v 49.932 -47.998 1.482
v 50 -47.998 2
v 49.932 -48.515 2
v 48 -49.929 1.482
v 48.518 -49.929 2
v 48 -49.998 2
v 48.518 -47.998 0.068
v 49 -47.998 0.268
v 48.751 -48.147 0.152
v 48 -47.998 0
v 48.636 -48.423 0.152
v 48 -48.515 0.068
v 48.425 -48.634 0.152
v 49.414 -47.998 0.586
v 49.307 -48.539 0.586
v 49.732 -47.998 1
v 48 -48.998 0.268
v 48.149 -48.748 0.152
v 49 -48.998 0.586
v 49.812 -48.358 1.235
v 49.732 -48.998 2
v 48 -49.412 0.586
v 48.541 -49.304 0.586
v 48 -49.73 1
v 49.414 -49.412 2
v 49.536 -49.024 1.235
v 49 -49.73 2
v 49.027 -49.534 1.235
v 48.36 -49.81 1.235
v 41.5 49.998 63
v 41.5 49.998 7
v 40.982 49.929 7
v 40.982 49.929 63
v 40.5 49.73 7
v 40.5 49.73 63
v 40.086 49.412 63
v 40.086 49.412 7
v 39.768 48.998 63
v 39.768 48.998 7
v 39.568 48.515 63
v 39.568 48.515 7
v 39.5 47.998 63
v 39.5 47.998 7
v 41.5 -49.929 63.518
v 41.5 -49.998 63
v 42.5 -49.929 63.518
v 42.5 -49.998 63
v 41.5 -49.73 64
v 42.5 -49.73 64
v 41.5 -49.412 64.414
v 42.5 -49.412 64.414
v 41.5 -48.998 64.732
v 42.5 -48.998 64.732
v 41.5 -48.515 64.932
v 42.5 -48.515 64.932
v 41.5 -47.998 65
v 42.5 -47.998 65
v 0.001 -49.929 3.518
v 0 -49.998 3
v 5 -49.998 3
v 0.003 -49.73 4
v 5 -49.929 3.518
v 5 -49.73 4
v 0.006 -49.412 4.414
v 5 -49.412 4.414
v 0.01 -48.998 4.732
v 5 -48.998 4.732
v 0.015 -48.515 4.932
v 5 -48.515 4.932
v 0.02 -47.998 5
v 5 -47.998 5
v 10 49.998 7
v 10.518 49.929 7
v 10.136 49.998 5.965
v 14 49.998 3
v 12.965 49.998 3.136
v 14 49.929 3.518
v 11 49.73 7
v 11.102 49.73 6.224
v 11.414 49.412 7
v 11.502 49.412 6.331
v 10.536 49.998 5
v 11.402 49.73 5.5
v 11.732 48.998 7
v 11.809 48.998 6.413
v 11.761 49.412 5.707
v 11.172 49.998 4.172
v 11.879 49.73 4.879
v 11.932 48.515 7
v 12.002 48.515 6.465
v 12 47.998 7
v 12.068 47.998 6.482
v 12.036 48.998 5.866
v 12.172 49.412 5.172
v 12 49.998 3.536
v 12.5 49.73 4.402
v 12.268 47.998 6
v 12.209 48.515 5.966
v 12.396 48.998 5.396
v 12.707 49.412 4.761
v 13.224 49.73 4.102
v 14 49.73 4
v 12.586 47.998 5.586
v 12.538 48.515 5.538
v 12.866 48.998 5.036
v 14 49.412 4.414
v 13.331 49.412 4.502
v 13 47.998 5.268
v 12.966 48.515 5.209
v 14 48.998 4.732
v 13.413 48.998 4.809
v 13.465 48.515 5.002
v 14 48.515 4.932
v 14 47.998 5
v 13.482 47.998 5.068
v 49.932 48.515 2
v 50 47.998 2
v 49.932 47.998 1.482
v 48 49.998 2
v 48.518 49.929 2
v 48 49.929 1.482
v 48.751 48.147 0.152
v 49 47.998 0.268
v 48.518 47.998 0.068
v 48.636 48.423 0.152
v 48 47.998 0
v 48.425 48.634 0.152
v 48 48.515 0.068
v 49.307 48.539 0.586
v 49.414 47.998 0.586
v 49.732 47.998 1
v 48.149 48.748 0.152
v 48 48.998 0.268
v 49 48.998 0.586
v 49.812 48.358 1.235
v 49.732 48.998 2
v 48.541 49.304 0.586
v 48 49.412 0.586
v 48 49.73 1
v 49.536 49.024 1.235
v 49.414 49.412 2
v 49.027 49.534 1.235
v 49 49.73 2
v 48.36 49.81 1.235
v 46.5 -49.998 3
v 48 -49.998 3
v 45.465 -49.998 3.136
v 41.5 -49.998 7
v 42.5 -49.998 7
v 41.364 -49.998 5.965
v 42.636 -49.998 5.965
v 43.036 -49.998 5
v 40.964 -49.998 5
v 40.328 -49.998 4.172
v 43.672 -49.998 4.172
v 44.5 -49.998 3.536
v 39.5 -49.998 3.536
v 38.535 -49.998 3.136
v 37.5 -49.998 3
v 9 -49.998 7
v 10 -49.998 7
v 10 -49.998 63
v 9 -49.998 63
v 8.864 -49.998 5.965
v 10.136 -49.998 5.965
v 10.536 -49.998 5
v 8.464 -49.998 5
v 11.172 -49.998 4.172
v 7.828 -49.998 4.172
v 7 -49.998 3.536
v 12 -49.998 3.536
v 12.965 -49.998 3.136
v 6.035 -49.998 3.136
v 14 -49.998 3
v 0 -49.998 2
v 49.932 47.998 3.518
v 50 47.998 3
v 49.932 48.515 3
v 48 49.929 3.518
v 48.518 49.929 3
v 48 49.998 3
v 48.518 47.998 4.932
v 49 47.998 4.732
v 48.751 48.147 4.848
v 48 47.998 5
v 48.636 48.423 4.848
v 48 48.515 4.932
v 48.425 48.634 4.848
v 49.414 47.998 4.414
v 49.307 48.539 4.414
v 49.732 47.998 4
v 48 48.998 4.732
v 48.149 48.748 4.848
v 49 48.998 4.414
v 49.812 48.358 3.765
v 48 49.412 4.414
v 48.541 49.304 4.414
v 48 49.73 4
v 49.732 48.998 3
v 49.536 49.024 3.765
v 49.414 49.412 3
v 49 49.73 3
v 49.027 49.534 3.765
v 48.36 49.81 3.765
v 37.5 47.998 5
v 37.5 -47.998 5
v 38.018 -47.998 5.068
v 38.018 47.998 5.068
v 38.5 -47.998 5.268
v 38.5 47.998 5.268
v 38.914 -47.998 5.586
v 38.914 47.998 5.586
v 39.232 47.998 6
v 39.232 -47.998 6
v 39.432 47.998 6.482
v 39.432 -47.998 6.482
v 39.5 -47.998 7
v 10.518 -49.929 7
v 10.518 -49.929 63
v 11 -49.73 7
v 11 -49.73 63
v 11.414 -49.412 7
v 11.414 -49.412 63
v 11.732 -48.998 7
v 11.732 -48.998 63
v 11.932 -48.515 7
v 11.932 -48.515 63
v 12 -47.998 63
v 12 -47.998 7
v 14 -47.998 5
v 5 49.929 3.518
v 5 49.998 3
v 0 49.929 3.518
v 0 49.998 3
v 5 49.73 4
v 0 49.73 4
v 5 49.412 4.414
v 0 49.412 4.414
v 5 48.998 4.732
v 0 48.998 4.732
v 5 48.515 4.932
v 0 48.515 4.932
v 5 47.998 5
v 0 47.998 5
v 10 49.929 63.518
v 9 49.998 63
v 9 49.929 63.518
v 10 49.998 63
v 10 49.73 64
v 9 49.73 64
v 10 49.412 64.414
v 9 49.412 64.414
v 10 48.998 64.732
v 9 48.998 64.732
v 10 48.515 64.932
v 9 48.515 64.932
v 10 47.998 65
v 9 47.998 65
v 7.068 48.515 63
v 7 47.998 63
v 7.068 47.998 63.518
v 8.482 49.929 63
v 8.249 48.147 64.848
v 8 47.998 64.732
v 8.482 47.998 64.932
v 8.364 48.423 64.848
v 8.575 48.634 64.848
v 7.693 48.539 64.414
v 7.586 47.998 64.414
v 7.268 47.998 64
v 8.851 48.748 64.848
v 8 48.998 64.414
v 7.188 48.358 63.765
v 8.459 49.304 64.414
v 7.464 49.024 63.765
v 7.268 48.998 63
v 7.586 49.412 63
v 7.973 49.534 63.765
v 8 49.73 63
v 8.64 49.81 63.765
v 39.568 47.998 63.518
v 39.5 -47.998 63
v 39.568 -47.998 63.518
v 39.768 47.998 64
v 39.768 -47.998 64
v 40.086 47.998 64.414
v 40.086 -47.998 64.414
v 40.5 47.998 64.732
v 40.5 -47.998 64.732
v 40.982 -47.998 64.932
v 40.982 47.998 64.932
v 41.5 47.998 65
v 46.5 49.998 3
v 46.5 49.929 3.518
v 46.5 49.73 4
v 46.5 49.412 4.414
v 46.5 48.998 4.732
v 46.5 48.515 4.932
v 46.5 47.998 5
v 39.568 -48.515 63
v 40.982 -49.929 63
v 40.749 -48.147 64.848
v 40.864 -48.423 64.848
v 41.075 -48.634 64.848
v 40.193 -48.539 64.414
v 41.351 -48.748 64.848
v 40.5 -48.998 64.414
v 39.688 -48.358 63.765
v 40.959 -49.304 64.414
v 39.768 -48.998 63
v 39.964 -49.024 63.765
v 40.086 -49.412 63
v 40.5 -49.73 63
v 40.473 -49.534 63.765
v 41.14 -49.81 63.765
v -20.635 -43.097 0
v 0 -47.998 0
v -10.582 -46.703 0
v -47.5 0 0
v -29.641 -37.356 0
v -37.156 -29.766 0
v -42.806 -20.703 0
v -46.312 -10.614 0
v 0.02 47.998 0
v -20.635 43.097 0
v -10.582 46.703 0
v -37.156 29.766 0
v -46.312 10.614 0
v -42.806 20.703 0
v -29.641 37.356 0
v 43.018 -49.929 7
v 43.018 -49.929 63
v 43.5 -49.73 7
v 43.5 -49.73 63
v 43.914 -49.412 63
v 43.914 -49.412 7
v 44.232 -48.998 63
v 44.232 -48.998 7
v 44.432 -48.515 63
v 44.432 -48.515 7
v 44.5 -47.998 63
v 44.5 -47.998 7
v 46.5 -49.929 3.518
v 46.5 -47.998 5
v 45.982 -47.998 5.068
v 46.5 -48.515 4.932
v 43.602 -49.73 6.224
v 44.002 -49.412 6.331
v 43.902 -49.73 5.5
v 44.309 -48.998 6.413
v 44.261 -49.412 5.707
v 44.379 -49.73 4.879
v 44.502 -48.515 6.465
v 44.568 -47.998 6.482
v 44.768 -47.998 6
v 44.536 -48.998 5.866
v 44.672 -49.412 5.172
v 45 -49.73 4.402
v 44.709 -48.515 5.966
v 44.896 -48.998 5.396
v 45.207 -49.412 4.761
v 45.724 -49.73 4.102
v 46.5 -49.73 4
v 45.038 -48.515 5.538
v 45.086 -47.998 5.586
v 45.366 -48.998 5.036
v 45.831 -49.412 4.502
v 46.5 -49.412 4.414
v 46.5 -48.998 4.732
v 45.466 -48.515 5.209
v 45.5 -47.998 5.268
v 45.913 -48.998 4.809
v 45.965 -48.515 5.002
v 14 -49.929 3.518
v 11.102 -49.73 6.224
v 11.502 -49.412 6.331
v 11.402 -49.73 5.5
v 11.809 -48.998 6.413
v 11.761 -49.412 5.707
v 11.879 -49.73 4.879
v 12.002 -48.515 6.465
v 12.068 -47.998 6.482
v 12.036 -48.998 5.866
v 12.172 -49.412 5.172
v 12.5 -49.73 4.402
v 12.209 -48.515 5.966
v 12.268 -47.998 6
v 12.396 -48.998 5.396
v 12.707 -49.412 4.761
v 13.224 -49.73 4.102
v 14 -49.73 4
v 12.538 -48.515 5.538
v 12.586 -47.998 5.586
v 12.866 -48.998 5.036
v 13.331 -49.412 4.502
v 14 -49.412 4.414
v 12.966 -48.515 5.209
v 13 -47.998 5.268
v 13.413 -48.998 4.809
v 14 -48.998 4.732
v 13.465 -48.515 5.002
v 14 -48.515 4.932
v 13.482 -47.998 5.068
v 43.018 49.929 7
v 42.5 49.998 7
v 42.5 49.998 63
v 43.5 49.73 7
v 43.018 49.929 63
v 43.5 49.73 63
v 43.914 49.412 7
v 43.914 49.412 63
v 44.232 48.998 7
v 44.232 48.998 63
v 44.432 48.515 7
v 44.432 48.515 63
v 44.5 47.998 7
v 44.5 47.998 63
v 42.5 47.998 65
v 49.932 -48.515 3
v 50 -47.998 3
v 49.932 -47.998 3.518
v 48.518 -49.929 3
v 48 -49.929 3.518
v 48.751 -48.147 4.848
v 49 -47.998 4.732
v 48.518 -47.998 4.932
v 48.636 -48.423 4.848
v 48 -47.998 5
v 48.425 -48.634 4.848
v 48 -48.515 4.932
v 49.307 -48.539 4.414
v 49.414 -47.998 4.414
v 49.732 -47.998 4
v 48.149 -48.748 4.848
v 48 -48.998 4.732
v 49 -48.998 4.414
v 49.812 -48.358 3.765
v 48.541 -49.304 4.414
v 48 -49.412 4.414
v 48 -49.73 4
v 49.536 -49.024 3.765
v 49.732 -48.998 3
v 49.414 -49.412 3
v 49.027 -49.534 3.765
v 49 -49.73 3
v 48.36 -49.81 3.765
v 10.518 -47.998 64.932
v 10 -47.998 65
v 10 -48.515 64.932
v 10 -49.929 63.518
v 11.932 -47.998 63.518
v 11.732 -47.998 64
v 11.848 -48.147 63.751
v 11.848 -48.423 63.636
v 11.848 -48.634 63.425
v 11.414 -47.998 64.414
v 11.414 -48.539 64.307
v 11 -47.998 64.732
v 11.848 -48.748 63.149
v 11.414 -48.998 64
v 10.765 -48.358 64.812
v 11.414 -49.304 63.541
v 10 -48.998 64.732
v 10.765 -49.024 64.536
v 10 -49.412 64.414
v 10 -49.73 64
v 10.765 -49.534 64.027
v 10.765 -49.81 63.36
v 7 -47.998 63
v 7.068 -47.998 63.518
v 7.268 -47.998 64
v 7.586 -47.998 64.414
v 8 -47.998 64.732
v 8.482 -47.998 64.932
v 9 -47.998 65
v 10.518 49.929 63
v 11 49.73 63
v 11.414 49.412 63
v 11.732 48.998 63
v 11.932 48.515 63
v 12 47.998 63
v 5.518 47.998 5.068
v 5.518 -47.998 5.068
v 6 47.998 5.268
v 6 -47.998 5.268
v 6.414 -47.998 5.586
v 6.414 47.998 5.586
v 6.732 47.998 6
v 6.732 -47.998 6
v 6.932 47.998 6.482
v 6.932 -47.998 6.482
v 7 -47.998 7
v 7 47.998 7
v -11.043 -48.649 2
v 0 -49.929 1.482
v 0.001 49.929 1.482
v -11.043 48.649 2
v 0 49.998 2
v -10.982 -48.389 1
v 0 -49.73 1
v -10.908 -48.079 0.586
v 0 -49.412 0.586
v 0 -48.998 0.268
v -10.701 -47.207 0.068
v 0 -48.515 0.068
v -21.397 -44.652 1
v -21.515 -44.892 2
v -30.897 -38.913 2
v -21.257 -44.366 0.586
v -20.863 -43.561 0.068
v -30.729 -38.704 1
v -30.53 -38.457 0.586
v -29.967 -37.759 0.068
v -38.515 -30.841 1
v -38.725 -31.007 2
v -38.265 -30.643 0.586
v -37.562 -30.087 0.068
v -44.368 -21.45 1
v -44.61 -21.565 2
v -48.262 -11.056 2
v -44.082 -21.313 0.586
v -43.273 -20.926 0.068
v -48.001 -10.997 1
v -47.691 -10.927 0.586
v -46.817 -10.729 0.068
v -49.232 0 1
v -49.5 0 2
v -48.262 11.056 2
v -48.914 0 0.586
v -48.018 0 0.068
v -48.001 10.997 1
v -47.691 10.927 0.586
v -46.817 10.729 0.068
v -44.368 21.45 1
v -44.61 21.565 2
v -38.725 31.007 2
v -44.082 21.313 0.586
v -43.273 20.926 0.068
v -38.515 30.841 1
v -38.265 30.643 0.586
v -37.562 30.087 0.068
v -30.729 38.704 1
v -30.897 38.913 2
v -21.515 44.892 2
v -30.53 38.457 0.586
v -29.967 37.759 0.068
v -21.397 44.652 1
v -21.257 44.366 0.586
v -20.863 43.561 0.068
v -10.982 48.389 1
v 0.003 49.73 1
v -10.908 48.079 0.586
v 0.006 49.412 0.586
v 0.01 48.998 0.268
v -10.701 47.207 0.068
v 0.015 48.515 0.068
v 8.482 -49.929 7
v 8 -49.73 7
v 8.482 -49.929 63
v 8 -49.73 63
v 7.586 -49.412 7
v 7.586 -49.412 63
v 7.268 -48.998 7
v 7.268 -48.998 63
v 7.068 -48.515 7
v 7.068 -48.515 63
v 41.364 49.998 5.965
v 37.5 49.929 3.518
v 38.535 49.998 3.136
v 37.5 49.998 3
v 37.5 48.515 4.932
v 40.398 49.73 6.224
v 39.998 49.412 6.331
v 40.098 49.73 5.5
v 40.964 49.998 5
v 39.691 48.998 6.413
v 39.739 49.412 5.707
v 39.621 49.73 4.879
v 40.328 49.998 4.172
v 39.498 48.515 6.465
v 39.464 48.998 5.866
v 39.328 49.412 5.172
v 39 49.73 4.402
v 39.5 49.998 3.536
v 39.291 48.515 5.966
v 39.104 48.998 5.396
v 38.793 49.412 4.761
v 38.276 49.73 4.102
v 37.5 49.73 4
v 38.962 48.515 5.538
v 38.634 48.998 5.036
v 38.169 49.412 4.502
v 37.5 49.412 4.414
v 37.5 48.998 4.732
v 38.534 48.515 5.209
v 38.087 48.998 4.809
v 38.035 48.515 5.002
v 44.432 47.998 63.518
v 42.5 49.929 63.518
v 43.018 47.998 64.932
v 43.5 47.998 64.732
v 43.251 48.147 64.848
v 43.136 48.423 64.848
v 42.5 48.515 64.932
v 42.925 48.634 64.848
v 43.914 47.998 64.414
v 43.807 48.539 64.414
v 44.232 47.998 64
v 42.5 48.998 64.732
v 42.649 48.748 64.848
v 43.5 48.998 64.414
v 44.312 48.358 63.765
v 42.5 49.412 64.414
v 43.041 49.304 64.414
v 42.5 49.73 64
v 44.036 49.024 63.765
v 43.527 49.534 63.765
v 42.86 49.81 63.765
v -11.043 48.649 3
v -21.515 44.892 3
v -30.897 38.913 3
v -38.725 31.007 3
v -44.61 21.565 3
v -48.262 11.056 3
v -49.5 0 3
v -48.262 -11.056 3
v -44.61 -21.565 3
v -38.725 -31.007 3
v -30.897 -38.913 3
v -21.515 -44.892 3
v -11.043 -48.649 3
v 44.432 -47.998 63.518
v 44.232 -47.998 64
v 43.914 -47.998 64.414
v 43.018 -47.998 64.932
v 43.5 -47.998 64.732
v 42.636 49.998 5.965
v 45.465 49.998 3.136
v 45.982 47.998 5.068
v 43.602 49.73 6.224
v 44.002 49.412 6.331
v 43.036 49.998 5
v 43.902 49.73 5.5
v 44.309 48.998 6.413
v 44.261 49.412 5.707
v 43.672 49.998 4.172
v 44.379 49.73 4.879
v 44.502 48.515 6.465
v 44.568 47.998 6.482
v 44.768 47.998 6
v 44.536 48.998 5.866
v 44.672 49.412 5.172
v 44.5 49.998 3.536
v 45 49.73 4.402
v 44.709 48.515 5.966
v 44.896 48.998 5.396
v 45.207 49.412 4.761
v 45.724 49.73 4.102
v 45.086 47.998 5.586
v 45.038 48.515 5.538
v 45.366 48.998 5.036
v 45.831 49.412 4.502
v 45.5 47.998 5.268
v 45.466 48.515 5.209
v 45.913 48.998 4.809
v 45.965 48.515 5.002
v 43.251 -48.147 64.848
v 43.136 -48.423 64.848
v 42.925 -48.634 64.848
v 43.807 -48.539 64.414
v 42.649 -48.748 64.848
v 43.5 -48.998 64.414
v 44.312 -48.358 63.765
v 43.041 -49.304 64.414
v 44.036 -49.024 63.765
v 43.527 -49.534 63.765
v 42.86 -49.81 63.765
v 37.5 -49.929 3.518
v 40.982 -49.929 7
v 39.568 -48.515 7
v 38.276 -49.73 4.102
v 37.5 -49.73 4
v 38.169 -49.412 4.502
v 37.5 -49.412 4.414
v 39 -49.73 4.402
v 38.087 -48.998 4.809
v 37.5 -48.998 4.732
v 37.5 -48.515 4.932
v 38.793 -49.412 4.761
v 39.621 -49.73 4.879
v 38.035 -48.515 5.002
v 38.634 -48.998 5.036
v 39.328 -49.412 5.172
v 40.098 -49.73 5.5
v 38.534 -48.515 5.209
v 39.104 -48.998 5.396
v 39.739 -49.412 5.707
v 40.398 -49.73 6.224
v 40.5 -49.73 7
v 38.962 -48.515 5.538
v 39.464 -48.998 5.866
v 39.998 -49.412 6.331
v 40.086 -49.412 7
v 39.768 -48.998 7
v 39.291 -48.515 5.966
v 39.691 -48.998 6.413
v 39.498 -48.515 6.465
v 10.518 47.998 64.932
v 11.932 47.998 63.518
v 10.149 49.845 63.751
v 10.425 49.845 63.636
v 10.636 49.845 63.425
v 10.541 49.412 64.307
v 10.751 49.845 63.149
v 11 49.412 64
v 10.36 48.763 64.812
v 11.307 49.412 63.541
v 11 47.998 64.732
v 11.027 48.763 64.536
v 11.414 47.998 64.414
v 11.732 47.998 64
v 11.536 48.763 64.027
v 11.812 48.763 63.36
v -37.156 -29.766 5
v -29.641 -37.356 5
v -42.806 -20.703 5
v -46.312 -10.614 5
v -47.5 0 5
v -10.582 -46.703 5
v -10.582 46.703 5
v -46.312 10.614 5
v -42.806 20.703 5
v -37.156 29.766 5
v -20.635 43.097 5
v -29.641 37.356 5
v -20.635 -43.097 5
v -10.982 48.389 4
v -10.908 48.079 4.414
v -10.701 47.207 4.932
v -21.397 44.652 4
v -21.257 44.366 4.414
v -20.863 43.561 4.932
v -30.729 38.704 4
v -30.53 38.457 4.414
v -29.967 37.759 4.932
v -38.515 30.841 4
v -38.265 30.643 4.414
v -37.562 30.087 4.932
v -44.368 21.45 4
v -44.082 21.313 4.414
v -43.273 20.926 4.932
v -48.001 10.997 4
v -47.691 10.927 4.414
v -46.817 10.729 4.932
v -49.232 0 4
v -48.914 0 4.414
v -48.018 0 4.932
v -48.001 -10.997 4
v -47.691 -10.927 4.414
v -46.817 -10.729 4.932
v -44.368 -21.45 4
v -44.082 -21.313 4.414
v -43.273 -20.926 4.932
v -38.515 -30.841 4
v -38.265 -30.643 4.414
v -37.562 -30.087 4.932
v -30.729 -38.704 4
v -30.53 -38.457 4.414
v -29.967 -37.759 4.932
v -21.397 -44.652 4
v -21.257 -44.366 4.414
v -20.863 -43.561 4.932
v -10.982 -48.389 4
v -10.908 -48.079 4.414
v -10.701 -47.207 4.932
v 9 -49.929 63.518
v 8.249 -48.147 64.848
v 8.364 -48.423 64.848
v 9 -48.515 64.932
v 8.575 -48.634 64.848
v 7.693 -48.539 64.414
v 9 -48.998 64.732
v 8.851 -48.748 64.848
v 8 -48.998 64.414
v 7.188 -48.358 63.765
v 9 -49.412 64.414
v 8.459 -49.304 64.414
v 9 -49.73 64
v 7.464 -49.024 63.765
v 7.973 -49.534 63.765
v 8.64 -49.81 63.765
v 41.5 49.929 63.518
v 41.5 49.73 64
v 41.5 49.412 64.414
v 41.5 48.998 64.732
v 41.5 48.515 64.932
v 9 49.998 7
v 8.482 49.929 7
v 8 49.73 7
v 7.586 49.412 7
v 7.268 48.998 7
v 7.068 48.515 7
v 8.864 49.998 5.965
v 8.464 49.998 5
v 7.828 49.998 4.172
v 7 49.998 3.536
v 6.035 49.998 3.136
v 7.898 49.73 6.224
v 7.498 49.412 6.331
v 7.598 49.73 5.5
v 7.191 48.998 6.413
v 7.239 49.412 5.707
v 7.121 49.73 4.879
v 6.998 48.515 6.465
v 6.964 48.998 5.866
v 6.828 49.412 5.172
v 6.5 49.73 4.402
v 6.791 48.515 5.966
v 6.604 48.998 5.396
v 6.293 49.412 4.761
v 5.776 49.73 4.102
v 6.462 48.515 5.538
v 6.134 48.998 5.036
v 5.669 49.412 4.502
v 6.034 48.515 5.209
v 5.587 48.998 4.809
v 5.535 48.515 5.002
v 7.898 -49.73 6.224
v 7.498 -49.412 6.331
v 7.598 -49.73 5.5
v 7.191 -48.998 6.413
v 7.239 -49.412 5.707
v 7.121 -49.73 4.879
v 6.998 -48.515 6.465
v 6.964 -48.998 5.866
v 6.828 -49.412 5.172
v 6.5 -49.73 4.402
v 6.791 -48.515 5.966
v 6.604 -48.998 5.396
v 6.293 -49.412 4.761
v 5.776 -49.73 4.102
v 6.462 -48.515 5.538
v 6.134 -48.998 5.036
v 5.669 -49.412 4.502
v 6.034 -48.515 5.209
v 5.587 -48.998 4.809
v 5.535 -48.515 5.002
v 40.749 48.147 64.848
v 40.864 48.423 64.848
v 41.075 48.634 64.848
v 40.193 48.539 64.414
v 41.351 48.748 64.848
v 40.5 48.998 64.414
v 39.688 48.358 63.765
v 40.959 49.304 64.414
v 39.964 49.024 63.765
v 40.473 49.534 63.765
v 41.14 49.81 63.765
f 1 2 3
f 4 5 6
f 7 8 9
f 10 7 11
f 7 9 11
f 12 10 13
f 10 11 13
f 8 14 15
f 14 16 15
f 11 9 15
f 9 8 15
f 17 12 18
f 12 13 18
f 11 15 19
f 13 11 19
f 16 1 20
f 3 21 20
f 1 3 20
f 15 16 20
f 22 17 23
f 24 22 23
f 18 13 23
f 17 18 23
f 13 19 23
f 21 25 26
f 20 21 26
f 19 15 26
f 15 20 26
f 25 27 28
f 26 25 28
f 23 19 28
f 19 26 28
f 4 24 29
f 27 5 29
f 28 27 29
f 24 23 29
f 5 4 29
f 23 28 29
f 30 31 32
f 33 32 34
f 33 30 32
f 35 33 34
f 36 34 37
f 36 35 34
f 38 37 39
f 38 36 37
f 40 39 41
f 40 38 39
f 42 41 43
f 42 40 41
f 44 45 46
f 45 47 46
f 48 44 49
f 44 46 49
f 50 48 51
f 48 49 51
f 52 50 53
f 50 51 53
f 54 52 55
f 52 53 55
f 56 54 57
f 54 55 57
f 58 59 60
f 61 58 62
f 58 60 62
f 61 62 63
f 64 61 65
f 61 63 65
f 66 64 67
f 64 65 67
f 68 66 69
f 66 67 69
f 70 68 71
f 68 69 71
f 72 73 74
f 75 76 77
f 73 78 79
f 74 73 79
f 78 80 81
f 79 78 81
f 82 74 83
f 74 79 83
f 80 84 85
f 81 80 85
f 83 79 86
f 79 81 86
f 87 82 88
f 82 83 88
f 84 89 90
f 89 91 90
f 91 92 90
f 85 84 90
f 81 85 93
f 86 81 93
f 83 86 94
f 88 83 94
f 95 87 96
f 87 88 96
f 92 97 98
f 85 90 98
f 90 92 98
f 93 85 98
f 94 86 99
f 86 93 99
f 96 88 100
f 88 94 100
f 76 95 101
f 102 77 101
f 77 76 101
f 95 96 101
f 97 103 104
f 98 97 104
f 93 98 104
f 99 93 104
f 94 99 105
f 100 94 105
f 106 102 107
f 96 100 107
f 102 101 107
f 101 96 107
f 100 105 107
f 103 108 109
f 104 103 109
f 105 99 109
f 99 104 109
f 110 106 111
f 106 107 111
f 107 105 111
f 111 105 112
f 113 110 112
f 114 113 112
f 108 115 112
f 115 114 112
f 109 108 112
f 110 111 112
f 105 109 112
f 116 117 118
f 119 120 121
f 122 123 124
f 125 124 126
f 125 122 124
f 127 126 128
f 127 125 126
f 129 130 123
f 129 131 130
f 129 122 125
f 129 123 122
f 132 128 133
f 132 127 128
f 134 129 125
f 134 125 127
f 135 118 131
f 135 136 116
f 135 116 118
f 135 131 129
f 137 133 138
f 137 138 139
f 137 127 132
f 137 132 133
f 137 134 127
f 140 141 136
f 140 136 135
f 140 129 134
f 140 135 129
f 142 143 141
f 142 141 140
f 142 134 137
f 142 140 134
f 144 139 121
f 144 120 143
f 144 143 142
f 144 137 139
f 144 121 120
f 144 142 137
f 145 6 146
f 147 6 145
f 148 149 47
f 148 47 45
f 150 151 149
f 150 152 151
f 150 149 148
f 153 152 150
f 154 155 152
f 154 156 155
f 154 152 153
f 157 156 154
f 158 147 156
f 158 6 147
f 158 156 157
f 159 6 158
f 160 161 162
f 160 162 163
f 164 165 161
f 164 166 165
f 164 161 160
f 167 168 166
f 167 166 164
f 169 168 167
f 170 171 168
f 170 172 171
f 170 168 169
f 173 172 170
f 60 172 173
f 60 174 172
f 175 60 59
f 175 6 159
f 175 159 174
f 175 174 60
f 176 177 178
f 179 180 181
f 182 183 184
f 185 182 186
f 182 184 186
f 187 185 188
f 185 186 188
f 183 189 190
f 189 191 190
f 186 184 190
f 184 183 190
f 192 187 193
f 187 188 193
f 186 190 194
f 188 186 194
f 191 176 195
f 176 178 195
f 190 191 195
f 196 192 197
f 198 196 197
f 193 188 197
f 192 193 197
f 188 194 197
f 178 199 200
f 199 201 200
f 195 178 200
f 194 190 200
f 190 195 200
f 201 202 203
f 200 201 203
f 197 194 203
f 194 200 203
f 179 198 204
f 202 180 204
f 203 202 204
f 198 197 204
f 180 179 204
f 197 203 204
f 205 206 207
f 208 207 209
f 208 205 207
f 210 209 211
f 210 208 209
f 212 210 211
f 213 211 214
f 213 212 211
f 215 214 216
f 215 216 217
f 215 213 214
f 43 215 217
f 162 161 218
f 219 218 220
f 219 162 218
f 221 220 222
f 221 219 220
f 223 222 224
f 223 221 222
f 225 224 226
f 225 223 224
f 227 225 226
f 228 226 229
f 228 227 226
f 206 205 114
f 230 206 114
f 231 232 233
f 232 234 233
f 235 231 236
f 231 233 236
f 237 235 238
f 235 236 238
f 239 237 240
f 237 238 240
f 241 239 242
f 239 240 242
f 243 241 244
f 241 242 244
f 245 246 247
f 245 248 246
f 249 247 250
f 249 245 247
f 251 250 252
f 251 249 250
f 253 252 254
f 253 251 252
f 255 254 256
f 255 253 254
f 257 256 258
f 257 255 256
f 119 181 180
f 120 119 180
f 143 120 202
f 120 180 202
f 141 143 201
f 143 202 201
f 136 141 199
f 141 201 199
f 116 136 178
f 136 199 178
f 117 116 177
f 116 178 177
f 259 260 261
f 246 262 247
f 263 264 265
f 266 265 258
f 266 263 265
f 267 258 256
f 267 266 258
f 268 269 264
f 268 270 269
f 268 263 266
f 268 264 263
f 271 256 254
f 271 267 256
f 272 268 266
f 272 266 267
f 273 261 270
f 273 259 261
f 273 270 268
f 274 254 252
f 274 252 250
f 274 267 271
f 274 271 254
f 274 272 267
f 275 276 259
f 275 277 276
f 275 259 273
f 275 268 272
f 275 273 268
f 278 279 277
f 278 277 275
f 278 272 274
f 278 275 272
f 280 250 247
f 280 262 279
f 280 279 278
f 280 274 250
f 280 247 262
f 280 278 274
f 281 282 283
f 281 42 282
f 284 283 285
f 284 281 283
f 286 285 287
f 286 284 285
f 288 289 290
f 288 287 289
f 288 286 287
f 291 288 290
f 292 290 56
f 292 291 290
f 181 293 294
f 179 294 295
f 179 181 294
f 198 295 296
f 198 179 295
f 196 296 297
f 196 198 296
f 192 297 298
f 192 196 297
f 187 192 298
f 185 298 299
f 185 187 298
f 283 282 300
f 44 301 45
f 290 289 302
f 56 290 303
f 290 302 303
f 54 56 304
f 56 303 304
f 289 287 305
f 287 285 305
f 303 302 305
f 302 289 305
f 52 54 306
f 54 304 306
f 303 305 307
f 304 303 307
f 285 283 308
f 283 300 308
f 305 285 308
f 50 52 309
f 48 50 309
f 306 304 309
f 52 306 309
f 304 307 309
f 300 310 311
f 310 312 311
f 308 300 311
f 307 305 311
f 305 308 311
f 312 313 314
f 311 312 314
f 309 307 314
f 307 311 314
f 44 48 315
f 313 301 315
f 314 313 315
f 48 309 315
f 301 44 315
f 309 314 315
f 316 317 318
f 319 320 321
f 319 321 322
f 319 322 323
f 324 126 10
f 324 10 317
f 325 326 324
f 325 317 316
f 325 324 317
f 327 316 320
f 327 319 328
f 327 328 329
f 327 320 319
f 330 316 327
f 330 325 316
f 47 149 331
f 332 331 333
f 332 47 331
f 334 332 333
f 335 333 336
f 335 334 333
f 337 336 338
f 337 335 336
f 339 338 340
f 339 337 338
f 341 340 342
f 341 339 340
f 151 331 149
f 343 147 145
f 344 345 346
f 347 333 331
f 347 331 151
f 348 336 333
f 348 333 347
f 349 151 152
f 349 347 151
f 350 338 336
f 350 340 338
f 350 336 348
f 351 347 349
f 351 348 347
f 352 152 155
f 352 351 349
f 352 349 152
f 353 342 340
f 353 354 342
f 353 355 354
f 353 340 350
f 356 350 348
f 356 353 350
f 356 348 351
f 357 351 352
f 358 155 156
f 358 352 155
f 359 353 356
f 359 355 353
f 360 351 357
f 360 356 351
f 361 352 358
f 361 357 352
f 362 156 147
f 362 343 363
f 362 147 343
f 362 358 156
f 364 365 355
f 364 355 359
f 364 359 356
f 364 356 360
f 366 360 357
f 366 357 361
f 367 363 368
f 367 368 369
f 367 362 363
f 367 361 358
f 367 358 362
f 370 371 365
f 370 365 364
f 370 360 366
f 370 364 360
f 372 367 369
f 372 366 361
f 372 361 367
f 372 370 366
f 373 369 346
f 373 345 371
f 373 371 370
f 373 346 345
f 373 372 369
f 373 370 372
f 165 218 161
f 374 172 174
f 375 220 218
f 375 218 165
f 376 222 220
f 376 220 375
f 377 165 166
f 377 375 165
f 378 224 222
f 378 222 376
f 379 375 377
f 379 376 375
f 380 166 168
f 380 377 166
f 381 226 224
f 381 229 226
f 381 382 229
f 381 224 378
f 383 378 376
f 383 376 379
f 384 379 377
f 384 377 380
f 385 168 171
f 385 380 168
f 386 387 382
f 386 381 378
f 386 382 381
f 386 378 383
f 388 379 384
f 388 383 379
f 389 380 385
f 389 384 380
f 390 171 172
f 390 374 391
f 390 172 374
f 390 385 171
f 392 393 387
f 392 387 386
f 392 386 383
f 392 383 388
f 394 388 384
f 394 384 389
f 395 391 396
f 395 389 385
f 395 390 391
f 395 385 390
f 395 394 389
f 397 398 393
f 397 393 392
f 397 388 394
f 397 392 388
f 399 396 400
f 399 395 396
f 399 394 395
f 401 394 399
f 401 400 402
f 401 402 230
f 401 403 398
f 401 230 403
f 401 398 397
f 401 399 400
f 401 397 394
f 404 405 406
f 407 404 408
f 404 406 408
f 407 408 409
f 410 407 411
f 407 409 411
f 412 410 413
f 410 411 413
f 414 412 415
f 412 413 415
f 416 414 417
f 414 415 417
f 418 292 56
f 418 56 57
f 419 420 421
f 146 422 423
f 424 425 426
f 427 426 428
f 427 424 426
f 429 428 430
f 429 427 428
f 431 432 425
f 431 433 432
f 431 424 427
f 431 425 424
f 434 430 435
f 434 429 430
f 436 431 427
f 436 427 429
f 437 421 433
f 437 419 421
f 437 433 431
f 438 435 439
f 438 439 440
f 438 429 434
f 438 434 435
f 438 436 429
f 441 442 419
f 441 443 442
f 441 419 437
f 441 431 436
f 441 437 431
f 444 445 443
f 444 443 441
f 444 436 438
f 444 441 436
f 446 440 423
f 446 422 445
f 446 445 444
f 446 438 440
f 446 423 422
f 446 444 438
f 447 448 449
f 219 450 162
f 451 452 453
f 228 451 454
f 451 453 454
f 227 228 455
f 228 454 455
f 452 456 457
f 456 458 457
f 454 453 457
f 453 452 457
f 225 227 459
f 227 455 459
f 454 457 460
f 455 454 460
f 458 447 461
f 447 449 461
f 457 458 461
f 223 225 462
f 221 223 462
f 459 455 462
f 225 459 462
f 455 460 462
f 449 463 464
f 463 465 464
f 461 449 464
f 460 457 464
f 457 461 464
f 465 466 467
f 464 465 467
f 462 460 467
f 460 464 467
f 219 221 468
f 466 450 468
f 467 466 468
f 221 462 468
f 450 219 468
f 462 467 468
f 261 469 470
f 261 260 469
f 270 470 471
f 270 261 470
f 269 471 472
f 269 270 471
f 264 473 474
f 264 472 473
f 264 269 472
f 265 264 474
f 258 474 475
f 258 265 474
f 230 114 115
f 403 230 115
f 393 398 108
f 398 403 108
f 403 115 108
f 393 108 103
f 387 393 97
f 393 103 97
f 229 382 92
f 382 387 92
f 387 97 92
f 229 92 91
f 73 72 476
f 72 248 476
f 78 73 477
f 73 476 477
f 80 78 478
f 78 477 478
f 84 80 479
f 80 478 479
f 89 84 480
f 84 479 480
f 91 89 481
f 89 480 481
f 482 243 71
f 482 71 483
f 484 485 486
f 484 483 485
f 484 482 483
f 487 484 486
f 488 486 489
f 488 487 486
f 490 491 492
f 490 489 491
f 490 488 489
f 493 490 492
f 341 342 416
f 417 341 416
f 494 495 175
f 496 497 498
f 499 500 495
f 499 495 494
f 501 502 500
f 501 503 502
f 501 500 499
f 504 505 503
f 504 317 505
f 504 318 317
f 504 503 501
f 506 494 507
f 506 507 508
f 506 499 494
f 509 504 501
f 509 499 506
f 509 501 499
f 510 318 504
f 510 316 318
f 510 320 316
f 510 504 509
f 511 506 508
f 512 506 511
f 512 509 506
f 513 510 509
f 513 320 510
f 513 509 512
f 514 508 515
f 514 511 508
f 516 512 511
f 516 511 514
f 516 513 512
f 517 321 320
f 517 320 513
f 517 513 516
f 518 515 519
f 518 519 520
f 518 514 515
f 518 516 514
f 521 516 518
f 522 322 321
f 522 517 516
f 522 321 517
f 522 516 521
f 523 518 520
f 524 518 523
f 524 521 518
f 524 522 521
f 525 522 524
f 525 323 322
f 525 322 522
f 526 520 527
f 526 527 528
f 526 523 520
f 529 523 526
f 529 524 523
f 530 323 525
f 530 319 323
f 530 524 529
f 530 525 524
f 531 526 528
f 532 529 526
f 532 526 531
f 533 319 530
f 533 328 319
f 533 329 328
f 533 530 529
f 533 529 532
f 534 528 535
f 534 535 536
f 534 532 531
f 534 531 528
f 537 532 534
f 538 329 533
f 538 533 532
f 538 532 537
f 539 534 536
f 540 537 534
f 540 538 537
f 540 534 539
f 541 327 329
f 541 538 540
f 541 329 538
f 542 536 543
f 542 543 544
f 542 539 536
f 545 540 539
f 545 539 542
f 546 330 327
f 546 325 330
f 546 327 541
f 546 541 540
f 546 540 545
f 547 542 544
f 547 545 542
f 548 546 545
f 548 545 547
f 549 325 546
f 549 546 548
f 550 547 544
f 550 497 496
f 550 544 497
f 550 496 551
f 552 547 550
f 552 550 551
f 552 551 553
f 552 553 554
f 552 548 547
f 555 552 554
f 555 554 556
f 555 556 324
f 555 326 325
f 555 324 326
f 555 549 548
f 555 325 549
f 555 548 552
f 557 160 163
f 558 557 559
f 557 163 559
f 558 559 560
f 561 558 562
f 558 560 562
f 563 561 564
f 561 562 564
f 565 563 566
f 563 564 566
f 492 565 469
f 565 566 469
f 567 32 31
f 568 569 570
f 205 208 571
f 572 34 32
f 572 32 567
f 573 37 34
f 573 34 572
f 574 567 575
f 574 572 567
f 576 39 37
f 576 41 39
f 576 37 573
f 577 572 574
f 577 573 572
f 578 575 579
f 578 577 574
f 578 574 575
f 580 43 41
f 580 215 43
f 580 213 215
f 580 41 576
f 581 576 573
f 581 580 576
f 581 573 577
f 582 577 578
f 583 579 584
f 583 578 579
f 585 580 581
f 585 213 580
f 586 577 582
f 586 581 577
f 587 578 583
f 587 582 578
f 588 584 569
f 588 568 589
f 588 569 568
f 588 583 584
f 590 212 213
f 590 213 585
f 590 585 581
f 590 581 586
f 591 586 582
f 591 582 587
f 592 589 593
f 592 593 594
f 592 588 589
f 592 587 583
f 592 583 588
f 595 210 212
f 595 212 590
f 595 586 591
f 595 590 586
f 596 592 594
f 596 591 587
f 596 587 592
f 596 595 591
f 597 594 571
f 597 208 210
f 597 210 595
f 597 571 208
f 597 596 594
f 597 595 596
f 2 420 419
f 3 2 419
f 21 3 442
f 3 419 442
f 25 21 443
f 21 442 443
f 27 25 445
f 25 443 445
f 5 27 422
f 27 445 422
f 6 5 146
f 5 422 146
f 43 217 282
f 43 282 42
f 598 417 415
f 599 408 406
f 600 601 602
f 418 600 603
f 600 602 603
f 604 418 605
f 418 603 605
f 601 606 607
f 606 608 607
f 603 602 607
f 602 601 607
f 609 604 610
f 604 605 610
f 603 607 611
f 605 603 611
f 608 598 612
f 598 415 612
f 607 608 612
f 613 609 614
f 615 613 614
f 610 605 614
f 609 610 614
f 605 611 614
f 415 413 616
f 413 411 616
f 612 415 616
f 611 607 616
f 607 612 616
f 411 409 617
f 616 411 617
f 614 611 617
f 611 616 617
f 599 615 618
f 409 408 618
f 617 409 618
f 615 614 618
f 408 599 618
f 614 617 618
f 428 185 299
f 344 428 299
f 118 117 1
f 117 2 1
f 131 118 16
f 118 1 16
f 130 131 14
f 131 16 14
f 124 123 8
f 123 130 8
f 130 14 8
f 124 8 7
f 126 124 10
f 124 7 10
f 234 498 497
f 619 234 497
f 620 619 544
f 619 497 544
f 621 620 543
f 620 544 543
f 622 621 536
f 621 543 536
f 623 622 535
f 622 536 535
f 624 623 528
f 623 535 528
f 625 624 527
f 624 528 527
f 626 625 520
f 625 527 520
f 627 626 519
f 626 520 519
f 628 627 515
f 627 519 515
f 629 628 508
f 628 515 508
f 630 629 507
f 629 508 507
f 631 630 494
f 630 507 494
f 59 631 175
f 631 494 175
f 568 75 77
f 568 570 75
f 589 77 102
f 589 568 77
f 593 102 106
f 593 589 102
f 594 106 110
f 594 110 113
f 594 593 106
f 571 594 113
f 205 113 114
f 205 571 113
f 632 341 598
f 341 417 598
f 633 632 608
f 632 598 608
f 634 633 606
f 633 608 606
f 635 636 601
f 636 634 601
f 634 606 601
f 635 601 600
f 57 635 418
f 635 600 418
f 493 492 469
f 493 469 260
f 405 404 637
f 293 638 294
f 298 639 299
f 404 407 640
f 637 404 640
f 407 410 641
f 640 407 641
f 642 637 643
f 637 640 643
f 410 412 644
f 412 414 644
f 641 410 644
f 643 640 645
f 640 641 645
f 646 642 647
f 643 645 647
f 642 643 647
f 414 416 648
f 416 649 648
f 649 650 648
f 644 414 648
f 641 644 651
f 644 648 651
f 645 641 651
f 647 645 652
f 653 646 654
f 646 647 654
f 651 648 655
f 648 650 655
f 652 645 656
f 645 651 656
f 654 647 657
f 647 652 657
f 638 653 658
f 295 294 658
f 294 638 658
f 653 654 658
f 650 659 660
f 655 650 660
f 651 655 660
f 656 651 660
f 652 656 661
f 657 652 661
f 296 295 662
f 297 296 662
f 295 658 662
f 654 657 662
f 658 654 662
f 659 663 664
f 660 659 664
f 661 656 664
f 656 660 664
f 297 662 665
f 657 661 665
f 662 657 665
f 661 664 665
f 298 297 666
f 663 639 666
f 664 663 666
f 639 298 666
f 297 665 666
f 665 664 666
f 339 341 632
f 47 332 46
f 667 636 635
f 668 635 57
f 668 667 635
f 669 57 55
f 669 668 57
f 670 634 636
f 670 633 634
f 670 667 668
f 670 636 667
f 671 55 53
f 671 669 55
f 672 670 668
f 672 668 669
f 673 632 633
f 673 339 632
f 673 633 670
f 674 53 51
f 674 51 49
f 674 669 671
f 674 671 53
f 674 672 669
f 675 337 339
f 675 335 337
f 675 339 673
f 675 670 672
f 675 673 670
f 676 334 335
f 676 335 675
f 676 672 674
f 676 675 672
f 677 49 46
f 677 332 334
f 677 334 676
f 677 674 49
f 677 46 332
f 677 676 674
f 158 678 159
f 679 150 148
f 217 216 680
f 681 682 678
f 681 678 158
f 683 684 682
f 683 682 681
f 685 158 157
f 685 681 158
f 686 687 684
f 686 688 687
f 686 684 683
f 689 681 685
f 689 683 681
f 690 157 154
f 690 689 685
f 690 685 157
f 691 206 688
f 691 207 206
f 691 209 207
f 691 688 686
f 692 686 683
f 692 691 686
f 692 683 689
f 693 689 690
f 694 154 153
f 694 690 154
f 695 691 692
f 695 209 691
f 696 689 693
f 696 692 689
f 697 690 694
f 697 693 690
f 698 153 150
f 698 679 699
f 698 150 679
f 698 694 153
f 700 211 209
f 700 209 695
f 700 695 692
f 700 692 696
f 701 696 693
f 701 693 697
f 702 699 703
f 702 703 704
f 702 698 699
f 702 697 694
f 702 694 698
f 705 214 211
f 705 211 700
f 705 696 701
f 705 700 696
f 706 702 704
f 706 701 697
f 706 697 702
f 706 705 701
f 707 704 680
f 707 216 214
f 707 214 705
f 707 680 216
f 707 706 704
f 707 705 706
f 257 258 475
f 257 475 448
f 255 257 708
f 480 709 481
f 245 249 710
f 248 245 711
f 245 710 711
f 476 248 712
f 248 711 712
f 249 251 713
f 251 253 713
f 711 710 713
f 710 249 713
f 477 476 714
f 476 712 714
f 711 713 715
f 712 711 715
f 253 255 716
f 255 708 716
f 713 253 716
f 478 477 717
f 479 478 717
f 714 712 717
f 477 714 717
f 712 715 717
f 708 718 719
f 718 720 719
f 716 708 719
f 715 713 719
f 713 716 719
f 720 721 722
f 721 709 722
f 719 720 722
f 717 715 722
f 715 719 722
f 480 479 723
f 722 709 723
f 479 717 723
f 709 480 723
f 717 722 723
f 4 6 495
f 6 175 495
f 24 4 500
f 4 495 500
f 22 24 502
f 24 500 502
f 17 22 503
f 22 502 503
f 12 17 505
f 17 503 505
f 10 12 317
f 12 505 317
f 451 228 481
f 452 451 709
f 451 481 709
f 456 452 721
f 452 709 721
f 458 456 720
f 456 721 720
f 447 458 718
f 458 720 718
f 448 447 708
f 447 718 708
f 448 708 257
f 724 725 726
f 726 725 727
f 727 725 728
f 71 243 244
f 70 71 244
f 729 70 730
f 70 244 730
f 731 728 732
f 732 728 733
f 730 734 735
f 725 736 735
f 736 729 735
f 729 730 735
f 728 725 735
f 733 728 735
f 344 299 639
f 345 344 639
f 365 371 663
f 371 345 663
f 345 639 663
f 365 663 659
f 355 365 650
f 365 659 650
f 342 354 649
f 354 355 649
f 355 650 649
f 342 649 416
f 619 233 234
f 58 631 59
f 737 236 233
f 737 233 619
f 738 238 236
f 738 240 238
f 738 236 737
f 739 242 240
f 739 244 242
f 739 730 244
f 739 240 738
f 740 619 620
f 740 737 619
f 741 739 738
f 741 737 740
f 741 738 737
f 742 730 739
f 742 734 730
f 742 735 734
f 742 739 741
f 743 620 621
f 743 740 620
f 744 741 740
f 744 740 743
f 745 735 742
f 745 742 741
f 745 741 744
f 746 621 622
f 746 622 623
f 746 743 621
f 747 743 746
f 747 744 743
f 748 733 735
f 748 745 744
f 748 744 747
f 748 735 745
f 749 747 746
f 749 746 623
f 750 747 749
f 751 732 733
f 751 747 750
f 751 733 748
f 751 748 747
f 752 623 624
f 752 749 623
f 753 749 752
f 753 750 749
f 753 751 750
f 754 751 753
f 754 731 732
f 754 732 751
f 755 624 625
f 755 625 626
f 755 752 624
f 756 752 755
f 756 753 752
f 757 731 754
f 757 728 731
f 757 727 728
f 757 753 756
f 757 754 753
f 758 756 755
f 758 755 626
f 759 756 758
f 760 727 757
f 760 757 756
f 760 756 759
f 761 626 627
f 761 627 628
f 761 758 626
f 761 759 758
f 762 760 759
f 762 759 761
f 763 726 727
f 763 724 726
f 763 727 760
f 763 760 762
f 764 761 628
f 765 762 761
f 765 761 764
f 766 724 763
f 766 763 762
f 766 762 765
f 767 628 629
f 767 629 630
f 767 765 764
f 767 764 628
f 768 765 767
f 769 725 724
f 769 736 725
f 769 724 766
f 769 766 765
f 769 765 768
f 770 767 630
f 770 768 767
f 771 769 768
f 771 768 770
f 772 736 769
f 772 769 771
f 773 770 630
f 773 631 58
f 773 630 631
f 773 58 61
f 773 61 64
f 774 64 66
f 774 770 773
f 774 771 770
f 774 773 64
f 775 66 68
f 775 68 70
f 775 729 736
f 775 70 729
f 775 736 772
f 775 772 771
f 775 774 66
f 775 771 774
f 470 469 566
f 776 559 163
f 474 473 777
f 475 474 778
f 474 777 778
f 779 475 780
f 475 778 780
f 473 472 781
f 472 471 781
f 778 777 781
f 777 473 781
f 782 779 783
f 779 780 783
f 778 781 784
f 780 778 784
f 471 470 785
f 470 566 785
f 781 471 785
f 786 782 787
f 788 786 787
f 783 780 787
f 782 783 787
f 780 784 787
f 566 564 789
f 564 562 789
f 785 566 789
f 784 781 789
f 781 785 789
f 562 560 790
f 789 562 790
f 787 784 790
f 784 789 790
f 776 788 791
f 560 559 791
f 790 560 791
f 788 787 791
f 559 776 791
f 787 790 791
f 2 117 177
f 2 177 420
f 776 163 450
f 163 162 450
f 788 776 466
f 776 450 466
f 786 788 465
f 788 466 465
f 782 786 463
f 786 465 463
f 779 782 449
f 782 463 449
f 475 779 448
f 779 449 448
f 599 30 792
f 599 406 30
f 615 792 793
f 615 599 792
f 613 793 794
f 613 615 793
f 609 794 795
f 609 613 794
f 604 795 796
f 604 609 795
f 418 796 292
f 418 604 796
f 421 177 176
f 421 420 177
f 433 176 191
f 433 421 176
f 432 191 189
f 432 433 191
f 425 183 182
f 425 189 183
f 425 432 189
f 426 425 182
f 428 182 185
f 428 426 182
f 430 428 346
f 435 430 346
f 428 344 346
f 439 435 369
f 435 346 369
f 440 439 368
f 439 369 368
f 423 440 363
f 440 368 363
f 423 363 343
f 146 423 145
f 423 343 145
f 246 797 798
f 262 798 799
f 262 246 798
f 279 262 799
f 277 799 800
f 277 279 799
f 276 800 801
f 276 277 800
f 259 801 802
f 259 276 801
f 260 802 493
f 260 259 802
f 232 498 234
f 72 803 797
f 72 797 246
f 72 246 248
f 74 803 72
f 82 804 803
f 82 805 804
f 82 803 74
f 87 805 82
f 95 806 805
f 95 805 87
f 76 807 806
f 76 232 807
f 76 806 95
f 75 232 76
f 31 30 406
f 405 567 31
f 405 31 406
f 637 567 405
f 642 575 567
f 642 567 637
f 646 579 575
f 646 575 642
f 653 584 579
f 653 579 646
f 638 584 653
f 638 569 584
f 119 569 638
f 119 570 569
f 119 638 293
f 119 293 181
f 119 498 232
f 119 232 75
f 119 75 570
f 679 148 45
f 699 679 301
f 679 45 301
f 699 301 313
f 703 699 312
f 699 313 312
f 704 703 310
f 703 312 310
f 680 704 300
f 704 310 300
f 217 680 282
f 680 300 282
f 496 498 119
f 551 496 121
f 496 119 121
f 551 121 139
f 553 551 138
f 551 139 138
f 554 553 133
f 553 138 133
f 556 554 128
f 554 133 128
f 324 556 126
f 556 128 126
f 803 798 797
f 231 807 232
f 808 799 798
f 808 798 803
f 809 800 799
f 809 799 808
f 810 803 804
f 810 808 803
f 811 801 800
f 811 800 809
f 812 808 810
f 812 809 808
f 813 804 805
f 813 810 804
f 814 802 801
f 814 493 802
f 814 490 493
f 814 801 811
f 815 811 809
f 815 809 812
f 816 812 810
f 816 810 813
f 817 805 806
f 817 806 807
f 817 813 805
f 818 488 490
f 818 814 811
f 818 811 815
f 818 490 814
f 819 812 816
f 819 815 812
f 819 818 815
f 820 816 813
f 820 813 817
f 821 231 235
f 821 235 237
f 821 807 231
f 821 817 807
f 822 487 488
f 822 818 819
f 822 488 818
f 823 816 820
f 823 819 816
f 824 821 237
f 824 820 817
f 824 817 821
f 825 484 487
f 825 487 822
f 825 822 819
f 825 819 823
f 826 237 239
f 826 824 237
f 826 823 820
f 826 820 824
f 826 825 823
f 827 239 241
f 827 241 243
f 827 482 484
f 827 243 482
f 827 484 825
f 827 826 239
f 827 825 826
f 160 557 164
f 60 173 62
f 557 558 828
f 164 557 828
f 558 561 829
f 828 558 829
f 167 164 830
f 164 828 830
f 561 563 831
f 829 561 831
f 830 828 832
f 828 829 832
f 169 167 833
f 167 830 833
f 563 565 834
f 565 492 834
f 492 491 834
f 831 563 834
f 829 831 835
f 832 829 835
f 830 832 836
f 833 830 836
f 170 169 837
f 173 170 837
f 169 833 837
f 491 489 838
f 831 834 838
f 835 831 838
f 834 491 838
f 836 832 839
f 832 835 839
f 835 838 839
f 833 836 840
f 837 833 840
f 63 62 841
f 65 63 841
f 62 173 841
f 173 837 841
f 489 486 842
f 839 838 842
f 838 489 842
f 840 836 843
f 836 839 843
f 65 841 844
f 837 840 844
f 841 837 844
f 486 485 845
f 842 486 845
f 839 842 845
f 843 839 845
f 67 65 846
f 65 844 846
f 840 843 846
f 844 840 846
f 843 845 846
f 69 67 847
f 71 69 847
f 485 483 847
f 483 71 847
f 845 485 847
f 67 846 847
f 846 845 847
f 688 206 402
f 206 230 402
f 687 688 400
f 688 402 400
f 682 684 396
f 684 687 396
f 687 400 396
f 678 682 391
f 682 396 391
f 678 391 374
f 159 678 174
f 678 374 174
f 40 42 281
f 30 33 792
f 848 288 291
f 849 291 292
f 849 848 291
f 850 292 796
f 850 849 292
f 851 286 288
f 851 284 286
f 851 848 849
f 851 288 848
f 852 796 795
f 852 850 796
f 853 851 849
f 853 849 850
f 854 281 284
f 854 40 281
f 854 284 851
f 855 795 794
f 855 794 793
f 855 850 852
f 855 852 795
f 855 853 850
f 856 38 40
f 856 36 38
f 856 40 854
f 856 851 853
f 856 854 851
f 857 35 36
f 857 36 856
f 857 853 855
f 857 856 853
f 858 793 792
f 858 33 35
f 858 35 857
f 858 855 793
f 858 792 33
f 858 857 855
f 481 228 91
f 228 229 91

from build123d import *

# Parameters (mm, degrees)
PAD_DEPTH    = 5
SKETCH001_W  = 5
SKETCH001_H  = 99.995
PAD001_DEPTH = 60
FILLET_R     = 2


with BuildPart() as part:
    # Sketch → Pad (new body)
    with BuildSketch(Plane.XY):
        with BuildLine():
            Line((0, 49.9975), (50, 49.9975))
            Line((50, 49.9975), (50, -49.9975))
            Line((50, -49.9975), (0, -49.9975))
            ThreePointArc((0, 49.9975), (-49.5, 0), (0, -49.9975))
        make_face()
    extrude(amount=PAD_DEPTH)

    # Sketch001 (on Face6 of Pad) → Pad001 (join)
    with BuildSketch(Plane.XY.offset(5)):
        with Locations((9.5, 0)):
            Rectangle(SKETCH001_W, SKETCH001_H)
        with Locations((42, 0)):
            Rectangle(SKETCH001_W, SKETCH001_H)
    extrude(amount=PAD001_DEPTH)

    # Fillet
    fillet_edges = [part.edges().sort_by_distance(p)[0] for p in [
        (50, 49.9975, 2.5),
        (50, -49.9975, 2.5),
        (50, 0, 0),
        (50, 0, 5),
        (25, 49.9975, 0),
        (25, -49.9975, 0),
        (-49.5, 0, 0),
        (0, 49.9975, 2.5),
        (0, -49.9975, 2.5),
        (-49.5, 0, 5),
        (3.5, 49.9975, 5),
        (7, 0, 5),
        (3.5, -49.9975, 5),
        (47.25, 49.9975, 5),
        (47.25, -49.9975, 5),
        (44.5, 0, 5),
        (7, 49.9975, 35),
        (7, -49.9975, 35),
        (7, 0, 65),
        (9.5, -49.9975, 65),
        (12, 0, 65),
        (9.5, 49.9975, 65),
        (25.75, 49.9975, 5),
        (39.5, 0, 5),
        (25.75, -49.9975, 5),
        (12, 0, 5),
        (12, -49.9975, 35),
        (12, 49.9975, 35),
        (39.5, 49.9975, 35),
        (39.5, -49.9975, 35),
        (39.5, 0, 65),
        (44.5, -49.9975, 35),
        (44.5, 49.9975, 35),
        (44.5, 0, 65),
        (42, -49.9975, 65),
        (42, 49.9975, 65),
    ]]
    fillet(fillet_edges, radius=FILLET_R)


solid = part.part
